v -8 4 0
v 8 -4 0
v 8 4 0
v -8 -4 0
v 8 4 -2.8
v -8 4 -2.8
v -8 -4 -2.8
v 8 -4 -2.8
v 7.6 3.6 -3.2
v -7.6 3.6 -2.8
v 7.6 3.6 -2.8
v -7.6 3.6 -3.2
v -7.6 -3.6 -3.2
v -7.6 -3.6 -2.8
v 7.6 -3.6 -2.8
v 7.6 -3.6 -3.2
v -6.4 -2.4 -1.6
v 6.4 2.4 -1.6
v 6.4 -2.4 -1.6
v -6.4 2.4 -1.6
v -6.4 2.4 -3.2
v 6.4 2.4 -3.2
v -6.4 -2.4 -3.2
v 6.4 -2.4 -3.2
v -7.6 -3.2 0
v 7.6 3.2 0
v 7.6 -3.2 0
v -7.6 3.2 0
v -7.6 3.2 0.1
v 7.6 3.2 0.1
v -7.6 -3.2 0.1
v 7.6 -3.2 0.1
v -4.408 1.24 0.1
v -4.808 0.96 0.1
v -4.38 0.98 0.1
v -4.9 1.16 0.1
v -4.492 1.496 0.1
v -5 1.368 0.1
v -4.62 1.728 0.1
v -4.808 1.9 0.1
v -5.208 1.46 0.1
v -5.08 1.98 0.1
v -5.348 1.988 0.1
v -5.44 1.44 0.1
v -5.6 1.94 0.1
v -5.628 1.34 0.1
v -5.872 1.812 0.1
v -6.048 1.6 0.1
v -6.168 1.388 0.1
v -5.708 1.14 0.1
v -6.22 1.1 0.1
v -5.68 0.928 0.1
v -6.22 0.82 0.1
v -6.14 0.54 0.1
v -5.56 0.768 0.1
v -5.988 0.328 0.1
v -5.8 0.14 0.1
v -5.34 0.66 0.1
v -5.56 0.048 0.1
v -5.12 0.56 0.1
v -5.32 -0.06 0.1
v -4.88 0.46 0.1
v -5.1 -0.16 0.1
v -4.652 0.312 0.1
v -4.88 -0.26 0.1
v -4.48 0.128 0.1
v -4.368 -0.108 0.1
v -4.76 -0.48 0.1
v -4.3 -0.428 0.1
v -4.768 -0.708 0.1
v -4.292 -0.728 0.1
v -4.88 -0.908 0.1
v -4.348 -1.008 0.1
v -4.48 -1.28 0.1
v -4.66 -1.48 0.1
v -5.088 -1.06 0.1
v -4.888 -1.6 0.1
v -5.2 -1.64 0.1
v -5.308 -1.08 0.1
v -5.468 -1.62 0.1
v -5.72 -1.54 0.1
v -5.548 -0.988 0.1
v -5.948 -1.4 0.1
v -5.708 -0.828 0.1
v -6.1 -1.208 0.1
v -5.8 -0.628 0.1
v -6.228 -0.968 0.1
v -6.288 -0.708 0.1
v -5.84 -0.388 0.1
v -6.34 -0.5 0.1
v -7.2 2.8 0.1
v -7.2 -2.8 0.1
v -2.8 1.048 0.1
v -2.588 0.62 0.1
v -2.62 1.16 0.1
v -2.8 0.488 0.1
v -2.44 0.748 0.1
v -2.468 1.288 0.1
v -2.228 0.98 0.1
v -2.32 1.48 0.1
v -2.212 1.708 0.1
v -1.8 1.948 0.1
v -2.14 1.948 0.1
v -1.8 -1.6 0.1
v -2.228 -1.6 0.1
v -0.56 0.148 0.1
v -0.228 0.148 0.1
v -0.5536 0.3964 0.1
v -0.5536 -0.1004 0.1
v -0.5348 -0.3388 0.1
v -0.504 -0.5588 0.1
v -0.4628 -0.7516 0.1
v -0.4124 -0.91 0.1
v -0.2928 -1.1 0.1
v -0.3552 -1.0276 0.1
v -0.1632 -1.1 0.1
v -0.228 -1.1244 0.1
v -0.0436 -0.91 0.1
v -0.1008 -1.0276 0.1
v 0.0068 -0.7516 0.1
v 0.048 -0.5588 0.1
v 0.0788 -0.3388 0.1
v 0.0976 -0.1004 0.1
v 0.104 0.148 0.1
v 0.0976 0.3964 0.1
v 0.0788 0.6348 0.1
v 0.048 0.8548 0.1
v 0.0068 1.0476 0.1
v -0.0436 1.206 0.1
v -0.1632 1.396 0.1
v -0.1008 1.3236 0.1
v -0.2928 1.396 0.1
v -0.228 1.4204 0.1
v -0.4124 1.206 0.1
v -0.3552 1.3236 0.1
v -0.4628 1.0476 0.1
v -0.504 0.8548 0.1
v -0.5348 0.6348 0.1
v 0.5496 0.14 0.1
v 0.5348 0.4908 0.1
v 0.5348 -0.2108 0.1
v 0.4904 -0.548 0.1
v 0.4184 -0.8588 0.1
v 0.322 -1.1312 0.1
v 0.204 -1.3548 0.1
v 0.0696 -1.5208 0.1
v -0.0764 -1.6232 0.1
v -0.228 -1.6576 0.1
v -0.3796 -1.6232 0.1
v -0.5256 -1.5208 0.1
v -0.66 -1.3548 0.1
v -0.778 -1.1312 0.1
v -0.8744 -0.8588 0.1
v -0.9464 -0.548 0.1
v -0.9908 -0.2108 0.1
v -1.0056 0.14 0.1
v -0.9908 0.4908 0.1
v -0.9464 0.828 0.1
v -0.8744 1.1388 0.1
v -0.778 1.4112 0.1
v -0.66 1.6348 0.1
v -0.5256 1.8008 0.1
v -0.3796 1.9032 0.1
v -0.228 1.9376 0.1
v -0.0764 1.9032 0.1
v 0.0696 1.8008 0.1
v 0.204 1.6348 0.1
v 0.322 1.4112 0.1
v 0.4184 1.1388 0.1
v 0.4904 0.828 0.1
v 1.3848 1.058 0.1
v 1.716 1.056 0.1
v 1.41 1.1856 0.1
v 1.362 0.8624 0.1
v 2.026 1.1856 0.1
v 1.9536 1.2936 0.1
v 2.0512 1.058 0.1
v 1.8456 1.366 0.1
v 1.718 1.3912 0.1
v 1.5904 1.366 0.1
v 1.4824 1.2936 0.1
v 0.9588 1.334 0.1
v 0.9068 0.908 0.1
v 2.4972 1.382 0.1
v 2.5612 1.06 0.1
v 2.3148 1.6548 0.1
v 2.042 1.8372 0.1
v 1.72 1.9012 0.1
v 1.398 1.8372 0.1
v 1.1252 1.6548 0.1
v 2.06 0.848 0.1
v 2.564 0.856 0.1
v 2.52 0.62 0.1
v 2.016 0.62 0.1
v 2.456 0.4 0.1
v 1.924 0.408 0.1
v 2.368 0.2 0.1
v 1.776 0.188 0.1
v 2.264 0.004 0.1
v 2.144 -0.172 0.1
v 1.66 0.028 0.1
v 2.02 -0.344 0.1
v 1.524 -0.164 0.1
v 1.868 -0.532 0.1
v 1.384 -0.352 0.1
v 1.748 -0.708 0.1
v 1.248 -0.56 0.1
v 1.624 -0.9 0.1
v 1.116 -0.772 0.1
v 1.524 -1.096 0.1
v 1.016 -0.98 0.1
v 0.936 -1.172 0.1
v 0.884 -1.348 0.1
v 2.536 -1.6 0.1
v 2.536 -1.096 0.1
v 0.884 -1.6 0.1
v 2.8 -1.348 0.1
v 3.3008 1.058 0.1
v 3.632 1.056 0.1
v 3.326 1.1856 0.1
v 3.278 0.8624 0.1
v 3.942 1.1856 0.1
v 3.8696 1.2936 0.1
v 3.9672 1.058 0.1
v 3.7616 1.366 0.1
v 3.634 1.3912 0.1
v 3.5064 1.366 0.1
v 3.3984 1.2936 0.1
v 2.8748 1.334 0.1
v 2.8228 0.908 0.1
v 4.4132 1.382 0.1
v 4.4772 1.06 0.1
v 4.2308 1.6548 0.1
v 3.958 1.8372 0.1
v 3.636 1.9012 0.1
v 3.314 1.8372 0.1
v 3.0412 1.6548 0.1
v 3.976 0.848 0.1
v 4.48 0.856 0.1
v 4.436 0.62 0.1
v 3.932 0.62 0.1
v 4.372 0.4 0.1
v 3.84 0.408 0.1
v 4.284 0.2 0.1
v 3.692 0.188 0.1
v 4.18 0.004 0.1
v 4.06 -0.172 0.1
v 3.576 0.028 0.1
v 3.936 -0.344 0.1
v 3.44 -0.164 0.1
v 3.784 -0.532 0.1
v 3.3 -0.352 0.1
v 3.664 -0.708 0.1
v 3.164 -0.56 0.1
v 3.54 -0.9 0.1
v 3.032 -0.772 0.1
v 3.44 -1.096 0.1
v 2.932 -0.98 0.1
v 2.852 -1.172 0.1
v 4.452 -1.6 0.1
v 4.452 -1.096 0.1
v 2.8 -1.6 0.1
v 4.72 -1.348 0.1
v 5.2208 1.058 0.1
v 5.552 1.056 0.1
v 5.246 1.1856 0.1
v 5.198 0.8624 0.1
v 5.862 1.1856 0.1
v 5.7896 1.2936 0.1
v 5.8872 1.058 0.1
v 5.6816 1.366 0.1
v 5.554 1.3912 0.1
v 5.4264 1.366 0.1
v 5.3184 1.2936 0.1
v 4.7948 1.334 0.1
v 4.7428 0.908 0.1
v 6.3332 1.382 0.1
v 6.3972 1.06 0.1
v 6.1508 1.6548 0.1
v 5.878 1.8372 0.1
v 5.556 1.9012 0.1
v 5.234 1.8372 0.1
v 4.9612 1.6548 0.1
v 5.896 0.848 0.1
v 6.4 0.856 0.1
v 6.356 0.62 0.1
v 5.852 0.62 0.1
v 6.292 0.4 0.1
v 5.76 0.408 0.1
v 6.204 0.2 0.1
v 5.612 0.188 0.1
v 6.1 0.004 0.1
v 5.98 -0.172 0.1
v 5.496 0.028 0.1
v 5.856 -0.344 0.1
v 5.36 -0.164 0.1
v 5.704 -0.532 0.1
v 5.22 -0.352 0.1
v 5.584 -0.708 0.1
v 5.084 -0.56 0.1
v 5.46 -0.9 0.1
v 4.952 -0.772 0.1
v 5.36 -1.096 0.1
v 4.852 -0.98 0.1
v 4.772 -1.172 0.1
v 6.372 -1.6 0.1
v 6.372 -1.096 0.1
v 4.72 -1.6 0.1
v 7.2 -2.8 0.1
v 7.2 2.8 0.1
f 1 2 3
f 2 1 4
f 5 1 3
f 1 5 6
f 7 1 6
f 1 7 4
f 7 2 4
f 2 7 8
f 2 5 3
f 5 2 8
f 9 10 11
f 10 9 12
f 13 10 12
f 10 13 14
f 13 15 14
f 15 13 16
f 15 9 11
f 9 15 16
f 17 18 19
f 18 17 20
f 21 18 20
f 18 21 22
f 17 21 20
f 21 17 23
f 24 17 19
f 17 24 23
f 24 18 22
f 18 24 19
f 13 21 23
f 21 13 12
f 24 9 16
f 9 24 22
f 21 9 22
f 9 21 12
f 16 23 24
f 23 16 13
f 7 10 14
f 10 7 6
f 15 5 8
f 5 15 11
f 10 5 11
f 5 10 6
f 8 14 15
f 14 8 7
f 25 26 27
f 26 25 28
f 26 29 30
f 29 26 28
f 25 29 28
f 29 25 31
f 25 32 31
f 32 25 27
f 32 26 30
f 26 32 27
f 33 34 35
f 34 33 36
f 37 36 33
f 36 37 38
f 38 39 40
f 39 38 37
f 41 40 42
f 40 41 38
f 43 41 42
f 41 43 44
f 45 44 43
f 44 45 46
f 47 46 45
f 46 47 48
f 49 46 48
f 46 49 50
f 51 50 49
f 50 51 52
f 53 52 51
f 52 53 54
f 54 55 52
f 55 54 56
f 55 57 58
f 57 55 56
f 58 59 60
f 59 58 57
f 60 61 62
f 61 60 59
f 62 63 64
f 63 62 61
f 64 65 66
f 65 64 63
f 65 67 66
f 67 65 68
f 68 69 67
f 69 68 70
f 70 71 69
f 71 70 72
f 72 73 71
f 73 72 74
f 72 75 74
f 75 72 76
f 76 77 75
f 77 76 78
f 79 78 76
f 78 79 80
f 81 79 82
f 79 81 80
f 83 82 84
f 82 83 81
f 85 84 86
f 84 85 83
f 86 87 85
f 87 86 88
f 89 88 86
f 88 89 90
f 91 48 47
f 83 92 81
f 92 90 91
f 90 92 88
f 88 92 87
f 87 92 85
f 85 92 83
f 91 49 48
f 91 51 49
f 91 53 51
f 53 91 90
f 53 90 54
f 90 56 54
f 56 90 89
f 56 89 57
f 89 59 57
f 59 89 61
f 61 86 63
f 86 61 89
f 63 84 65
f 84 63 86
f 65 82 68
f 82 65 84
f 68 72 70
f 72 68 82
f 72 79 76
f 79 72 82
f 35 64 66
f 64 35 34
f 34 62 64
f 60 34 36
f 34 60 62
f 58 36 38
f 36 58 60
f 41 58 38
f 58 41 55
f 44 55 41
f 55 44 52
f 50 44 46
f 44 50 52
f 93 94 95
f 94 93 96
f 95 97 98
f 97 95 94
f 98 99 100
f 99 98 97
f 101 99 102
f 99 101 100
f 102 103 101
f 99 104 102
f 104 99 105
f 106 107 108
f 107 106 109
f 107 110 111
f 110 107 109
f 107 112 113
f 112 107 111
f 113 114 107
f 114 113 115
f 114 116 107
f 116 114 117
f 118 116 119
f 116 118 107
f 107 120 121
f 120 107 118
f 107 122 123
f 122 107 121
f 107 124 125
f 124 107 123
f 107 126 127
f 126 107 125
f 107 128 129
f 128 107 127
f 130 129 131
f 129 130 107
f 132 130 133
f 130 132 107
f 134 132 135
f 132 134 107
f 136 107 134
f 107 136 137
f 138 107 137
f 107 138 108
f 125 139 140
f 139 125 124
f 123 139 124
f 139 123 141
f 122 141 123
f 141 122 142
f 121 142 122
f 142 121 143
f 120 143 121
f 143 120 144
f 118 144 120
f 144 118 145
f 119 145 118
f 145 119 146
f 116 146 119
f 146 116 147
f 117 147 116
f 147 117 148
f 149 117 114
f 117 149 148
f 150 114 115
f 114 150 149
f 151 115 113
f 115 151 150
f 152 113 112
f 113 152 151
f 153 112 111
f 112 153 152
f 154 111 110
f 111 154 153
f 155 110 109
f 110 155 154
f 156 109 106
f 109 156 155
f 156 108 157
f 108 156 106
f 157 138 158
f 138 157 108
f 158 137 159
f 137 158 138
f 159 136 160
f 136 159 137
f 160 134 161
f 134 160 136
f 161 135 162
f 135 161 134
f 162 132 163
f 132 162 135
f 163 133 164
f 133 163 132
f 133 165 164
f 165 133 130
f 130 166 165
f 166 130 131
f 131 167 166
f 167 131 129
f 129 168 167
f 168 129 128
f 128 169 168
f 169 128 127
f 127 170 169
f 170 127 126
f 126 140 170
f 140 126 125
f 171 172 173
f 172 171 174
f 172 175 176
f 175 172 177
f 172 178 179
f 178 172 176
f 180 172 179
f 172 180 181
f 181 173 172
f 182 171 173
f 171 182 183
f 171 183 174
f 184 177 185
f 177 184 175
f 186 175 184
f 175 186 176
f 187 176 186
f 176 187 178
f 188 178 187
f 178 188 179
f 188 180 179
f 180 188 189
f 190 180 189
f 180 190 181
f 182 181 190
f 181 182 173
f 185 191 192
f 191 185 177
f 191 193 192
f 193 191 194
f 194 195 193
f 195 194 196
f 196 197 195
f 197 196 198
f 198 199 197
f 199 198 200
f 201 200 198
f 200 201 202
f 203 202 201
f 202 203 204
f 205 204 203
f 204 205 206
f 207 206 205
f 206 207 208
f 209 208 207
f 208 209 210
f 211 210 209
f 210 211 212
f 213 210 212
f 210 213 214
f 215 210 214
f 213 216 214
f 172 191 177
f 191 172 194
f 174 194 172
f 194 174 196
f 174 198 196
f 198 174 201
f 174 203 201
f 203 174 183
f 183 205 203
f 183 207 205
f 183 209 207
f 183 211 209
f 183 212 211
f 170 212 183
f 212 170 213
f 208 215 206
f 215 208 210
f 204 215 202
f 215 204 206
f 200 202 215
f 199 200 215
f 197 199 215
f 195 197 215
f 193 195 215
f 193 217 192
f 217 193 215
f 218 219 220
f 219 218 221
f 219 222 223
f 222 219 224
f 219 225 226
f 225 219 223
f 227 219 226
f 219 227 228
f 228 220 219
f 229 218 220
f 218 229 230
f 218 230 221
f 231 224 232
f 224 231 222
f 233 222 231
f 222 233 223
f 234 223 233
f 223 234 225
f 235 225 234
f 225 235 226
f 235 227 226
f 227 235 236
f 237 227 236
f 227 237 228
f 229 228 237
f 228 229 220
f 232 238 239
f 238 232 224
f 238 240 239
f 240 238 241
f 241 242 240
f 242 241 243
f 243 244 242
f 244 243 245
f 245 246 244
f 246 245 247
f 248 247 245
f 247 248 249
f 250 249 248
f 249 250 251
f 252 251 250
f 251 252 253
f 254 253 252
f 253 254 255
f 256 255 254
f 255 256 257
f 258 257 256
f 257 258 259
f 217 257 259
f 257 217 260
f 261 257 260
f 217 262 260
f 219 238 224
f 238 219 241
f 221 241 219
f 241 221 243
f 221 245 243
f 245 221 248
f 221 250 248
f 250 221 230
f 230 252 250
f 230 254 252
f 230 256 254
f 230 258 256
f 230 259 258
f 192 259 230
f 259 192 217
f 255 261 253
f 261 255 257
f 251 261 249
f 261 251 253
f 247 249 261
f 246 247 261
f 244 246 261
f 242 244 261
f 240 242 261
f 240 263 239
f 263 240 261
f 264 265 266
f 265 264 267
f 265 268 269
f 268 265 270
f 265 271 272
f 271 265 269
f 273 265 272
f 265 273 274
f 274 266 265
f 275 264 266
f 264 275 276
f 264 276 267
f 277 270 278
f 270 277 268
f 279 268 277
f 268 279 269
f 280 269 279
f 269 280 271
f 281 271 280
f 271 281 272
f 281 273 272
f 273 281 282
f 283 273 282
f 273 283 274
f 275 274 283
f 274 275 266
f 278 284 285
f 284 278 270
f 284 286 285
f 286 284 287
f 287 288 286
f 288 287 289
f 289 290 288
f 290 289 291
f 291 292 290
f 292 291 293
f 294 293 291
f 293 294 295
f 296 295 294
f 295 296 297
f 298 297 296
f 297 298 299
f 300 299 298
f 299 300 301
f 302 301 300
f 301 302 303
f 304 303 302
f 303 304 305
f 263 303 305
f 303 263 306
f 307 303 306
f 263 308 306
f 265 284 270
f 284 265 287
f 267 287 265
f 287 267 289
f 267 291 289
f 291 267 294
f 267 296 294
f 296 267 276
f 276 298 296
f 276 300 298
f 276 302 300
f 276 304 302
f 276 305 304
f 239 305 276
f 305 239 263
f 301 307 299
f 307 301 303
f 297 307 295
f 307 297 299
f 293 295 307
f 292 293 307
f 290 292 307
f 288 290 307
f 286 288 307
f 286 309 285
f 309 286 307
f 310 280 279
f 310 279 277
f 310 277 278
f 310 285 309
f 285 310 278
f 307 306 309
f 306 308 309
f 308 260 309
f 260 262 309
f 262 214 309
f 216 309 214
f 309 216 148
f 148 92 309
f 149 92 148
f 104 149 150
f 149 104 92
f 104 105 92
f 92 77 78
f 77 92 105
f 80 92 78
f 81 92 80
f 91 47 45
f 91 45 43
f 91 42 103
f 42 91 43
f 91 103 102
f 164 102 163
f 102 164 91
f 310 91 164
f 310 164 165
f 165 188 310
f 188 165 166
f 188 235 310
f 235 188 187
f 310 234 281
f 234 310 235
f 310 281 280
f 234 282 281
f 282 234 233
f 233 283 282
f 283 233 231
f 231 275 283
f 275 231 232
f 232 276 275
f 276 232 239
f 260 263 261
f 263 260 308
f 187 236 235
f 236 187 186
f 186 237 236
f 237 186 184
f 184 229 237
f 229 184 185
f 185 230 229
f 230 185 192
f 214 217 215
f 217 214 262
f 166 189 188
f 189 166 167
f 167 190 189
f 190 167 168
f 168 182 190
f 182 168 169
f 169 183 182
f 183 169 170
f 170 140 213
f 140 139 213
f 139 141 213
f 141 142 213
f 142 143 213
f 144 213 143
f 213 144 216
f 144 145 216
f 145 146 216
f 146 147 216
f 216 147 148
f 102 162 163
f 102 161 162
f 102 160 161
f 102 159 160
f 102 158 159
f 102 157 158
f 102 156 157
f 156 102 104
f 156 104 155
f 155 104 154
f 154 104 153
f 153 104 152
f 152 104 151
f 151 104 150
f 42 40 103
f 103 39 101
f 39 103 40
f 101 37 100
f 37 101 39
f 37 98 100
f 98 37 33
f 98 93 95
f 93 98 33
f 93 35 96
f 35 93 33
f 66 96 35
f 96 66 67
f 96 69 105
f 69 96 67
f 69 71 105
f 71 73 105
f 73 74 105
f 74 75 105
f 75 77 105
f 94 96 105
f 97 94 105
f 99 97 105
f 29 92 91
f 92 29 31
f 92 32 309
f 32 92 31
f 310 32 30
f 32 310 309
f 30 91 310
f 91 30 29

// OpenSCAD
// file: ../p/box5.scad
use <../lib.scad>
function ldraw_lib__box5() = [
// 0 Box with 5 Faces and All Edges
// 0 Name: box5.dat
// 0 Author: James Jessiman
// 0 !LDRAW_ORG Primitive UPDATE 2012-01
// 0 !LICENSE Licensed under CC BY 4.0 : see CAreadme.txt
// 
// 0 BFC CERTIFY CCW
  [0,"BFC","CERTIFY"],
  [0,"BFC","CCW"],
// 
// 0 !HISTORY 2002-04-03 [sbliss] Modified for BFC compliance
// 0 !HISTORY 2002-04-25 [PTadmin] Official Update 2002-02
// 0 !HISTORY 2007-06-24 [PTadmin] Header formatted for Contributor Agreement
// 0 !HISTORY 2008-07-01 [PTadmin] Official Update 2008-01
// 0 !HISTORY 2012-02-16 [Philo] Changed to CCW
// 0 !HISTORY 2012-03-30 [PTadmin] Official Update 2012-01
// 
// 
// 2 24 1 1 1 -1 1 1
  [2,24,1,1,1,-1,1,1],
// 2 24 -1 1 1 -1 1 -1
  [2,24,-1,1,1,-1,1,-1],
// 2 24 -1 1 -1 1 1 -1
  [2,24,-1,1,-1,1,1,-1],
// 2 24 1 1 -1 1 1 1
  [2,24,1,1,-1,1,1,1],
// 2 24 1 0 1 -1 0 1
  [2,24,1,0,1,-1,0,1],
// 2 24 -1 0 1 -1 0 -1
  [2,24,-1,0,1,-1,0,-1],
// 2 24 -1 0 -1 1 0 -1
  [2,24,-1,0,-1,1,0,-1],
// 2 24 1 0 -1 1 0 1
  [2,24,1,0,-1,1,0,1],
// 2 24 1 0 1 1 1 1
  [2,24,1,0,1,1,1,1],
// 2 24 -1 0 1 -1 1 1
  [2,24,-1,0,1,-1,1,1],
// 2 24 1 0 -1 1 1 -1
  [2,24,1,0,-1,1,1,-1],
// 2 24 -1 0 -1 -1 1 -1
  [2,24,-1,0,-1,-1,1,-1],
// 4 16 -1 1 1 1 1 1 1 1 -1 -1 1 -1
  [4,16,-1,1,1,1,1,1,1,1,-1,-1,1,-1],
// 4 16 -1 1 1 -1 0 1 1 0 1 1 1 1
  [4,16,-1,1,1,-1,0,1,1,0,1,1,1,1],
// 4 16 -1 1 -1 -1 0 -1 -1 0 1 -1 1 1
  [4,16,-1,1,-1,-1,0,-1,-1,0,1,-1,1,1],
// 4 16 1 1 -1 1 0 -1 -1 0 -1 -1 1 -1
  [4,16,1,1,-1,1,0,-1,-1,0,-1,-1,1,-1],
// 4 16 1 1 1 1 0 1 1 0 -1 1 1 -1
  [4,16,1,1,1,1,0,1,1,0,-1,1,1,-1],
];
module ldraw_lib__box5(step=0, col=false, unit=2/5, alt=false, line=0.2, solid=!$preview)
    makepoly(ldraw_lib__box5(), step=step, col=col, unit=unit, alt=alt, line=line, solid=solid);
ldraw_lib__box5(line=0.2);
// file: ../p/box4.scad
use <../lib.scad>
function ldraw_lib__box4() = [
// 0 Box with 4 Faces (2 Parallel Pairs) and All Edges
// 0 Name: box4.dat
// 0 Author: James Jessiman
// 0 !LDRAW_ORG Primitive UPDATE 2012-01
// 0 !LICENSE Licensed under CC BY 4.0 : see CAreadme.txt
// 
// 0 BFC CERTIFY CCW
  [0,"BFC","CERTIFY"],
  [0,"BFC","CCW"],
// 
// 0 !HISTORY 2002-04-03 [sbliss] Modified for BFC compliance
// 0 !HISTORY 2002-04-25 [PTadmin] Official Update 2002-02
// 0 !HISTORY 2007-06-24 [PTadmin] Header formatted for Contributor Agreement
// 0 !HISTORY 2008-07-01 [PTadmin] Official Update 2008-01
// 0 !HISTORY 2012-02-16 [Philo] Changed to CCW
// 0 !HISTORY 2012-03-30 [PTadmin] Official Update 2012-01
// 
// 
// 2 24 1 1 1 -1 1 1
  [2,24,1,1,1,-1,1,1],
// 2 24 -1 1 1 -1 1 -1
  [2,24,-1,1,1,-1,1,-1],
// 2 24 -1 1 -1 1 1 -1
  [2,24,-1,1,-1,1,1,-1],
// 2 24 1 1 -1 1 1 1
  [2,24,1,1,-1,1,1,1],
// 2 24 1 0 1 -1 0 1
  [2,24,1,0,1,-1,0,1],
// 2 24 -1 0 1 -1 0 -1
  [2,24,-1,0,1,-1,0,-1],
// 2 24 -1 0 -1 1 0 -1
  [2,24,-1,0,-1,1,0,-1],
// 2 24 1 0 -1 1 0 1
  [2,24,1,0,-1,1,0,1],
// 2 24 1 0 1 1 1 1
  [2,24,1,0,1,1,1,1],
// 2 24 -1 0 1 -1 1 1
  [2,24,-1,0,1,-1,1,1],
// 2 24 1 0 -1 1 1 -1
  [2,24,1,0,-1,1,1,-1],
// 2 24 -1 0 -1 -1 1 -1
  [2,24,-1,0,-1,-1,1,-1],
// 4 16 -1 1 1 -1 0 1 1 0 1 1 1 1
  [4,16,-1,1,1,-1,0,1,1,0,1,1,1,1],
// 4 16 -1 1 -1 -1 0 -1 -1 0 1 -1 1 1
  [4,16,-1,1,-1,-1,0,-1,-1,0,1,-1,1,1],
// 4 16 1 1 -1 1 0 -1 -1 0 -1 -1 1 -1
  [4,16,1,1,-1,1,0,-1,-1,0,-1,-1,1,-1],
// 4 16 1 1 1 1 0 1 1 0 -1 1 1 -1
  [4,16,1,1,1,1,0,1,1,0,-1,1,1,-1],
];
module ldraw_lib__box4(step=0, col=false, unit=2/5, alt=false, line=0.2, solid=!$preview)
    makepoly(ldraw_lib__box4(), step=step, col=col, unit=unit, alt=alt, line=line, solid=solid);
ldraw_lib__box4(line=0.2);
// file: ../p/box5-12.scad
use <../lib.scad>
function ldraw_lib__box5_12() = [
// 0 Box with 5 Faces without Any Edges
// 0 Name: box5-12.dat
// 0 Author: Chris Dee [cwdee]
// 0 !LDRAW_ORG Primitive UPDATE 2009-02
// 0 !LICENSE Licensed under CC BY 4.0 : see CAreadme.txt
// 
// 0 BFC CERTIFY CCW
  [0,"BFC","CERTIFY"],
  [0,"BFC","CCW"],
// 
// 0 !HISTORY 2009-09-03 [PTadmin] Official Update 2009-02
// 
// 
// 4 16 1 1 1 1 1 -1 -1 1 -1 -1 1 1
  [4,16,1,1,1,1,1,-1,-1,1,-1,-1,1,1],
// 4 16 -1 0 1 1 0 1 1 1 1 -1 1 1
  [4,16,-1,0,1,1,0,1,1,1,1,-1,1,1],
// 4 16 -1 0 -1 -1 0 1 -1 1 1 -1 1 -1
  [4,16,-1,0,-1,-1,0,1,-1,1,1,-1,1,-1],
// 4 16 1 0 -1 -1 0 -1 -1 1 -1 1 1 -1
  [4,16,1,0,-1,-1,0,-1,-1,1,-1,1,1,-1],
// 4 16 1 0 1 1 0 -1 1 1 -1 1 1 1
  [4,16,1,0,1,1,0,-1,1,1,-1,1,1,1],
// 0
];
module ldraw_lib__box5_12(step=0, col=false, unit=2/5, alt=false, line=0.2, solid=!$preview)
    makepoly(ldraw_lib__box5_12(), step=step, col=col, unit=unit, alt=alt, line=line, solid=solid);
ldraw_lib__box5_12(line=0.2);
// file: s/3069bs01.scad
use <../../lib.scad>
use <../../p/box4.scad>
use <../../p/box5.scad>
function ldraw_lib__s__3069bs01() = [
// 0 ~Tile  1 x  2 with Groove without Top Face
// 0 Name: s\3069bs01.dat
// 0 Author: Santeri Piippo [arezey]
// 0 !LDRAW_ORG Subpart UPDATE 2010-02
// 0 !LICENSE Licensed under CC BY 4.0 : see CAreadme.txt
// 
// 0 BFC CERTIFY CCW
  [0,"BFC","CERTIFY"],
  [0,"BFC","CCW"],
// 
// 0 !HISTORY 2010-07-05 [PTadmin] Official Update 2010-02
// 
// 
// 1 16 0 0 0 20 0 0 0 7 0 0 0 10 box4.dat
  [1,16,0,0,0,20,0,0,0,7,0,0,0,10, ldraw_lib__box4()],
// 1 16 0 7 0 19 0 0 0 1 0 0 0 9 box4.dat
  [1,16,0,7,0,19,0,0,0,1,0,0,0,9, ldraw_lib__box4()],
// 0 BFC INVERTNEXT
  [0,"BFC","INVERTNEXT"],
// 1 16 0 8 0 16 0 0 0 -4 0 0 0 6 box5.dat
  [1,16,0,8,0,16,0,0,0,-4,0,0,0,6, ldraw_lib__box5()],
// 4 16 -19 8 9 -16 8 6 -16 8 -6 -19 8 -9
  [4,16,-19,8,9,-16,8,6,-16,8,-6,-19,8,-9],
// 4 16 19 8 -9 16 8 -6 16 8 6 19 8 9
  [4,16,19,8,-9,16,8,-6,16,8,6,19,8,9],
// 4 16 19 8 9 16 8 6 -16 8 6 -19 8 9
  [4,16,19,8,9,16,8,6,-16,8,6,-19,8,9],
// 4 16 -19 8 -9 -16 8 -6 16 8 -6 19 8 -9
  [4,16,-19,8,-9,-16,8,-6,16,8,-6,19,8,-9],
// 4 16 -20 7 10 -19 7 9 -19 7 -9 -20 7 -10
  [4,16,-20,7,10,-19,7,9,-19,7,-9,-20,7,-10],
// 4 16 20 7 -10 19 7 -9 19 7 9 20 7 10
  [4,16,20,7,-10,19,7,-9,19,7,9,20,7,10],
// 4 16 20 7 10 19 7 9 -19 7 9 -20 7 10
  [4,16,20,7,10,19,7,9,-19,7,9,-20,7,10],
// 4 16 -20 7 -10 -19 7 -9 19 7 -9 20 7 -10
  [4,16,-20,7,-10,-19,7,-9,19,7,-9,20,7,-10],
// 0 //
];
module ldraw_lib__s__3069bs01(step=0, col=false, unit=2/5, alt=false, line=0.2, solid=!$preview)
    makepoly(ldraw_lib__s__3069bs01(), step=step, col=col, unit=unit, alt=alt, line=line, solid=solid);
ldraw_lib__s__3069bs01(line=0.2);
// file: 3069b.scad
use <../lib.scad>
use <s/3069bs01.scad>
function ldraw_lib__3069b() = [
// 0 Tile  1 x  2 with Groove
// 0 Name: 3069b.dat
// 0 Author: Santeri Piippo [arezey]
// 0 !LDRAW_ORG Part UPDATE 2010-02
// 0 !LICENSE Licensed under CC BY 4.0 : see CAreadme.txt
// 
// 0 BFC CERTIFY CCW
  [0,"BFC","CERTIFY"],
  [0,"BFC","CCW"],
// 
// 0 !HISTORY 2010-07-05 [PTadmin] Official Update 2010-02
// 
// 
// 4 16 20 0 -10 20 0 10 -20 0 10 -20 0 -10
  [4,16,20,0,-10,20,0,10,-20,0,10,-20,0,-10],
// 1 16 0 0 0 1 0 0 0 1 0 0 0 1 s\3069bs01.dat
  [1,16,0,0,0,1,0,0,0,1,0,0,0,1, ldraw_lib__s__3069bs01()],
// 0 //
];
module ldraw_lib__3069b(step=0, col=false, unit=2/5, alt=false, line=0.2, solid=!$preview)
    makepoly(ldraw_lib__3069b(), step=step, col=col, unit=unit, alt=alt, line=line, solid=solid);
ldraw_lib__3069b(line=0.2);
// main file
use <../lib.scad>
use <3069b.scad>
use <4629677d.scad>
function ldraw_lib__3069bd00() = [
// 0 Tile  1 x  2 with "S 10222" License Plate Sticker
// 0 Name: 3069bd00.dat
// 0 Author: Takeshi Takahashi [RainbowDolphin]
// 0 !LDRAW_ORG Shortcut UPDATE 2024-11
// 0 !LICENSE Licensed under CC BY 4.0 : see CAreadme.txt
// 
// 0 BFC CERTIFY CCW
  [0,"BFC","CERTIFY"],
  [0,"BFC","CCW"],
// 
// 0 !CATEGORY Sticker Shortcut
// 0 !KEYWORDS Bricklink 3069pb0383, Mail van, Post office, set 10222, truck
// 0 !KEYWORDS Winter Village
// 
// 0 !HISTORY 2024-12-30 [OrionP] Official Update 2024-11
// 
// 1 16 0 0 0 1 0 0 0 1 0 0 0 1 3069b.dat
  [1,16,0,0,0,1,0,0,0,1,0,0,0,1, ldraw_lib__3069b()],
// 1 16 0 0 0 1 0 0 0 1 0 0 0 1 4629677d.dat
  [1,16,0,0,0,1,0,0,0,1,0,0,0,1, ldraw_lib__4629677d()],
];
module ldraw_lib__3069bd00(step=0, col=false, unit=2/5, alt=false, line=0.2, solid=!$preview)
    makepoly(ldraw_lib__3069bd00(), step=step, col=col, unit=unit, alt=alt, line=line, solid=solid);
ldraw_lib__3069bd00(line=0.2);
